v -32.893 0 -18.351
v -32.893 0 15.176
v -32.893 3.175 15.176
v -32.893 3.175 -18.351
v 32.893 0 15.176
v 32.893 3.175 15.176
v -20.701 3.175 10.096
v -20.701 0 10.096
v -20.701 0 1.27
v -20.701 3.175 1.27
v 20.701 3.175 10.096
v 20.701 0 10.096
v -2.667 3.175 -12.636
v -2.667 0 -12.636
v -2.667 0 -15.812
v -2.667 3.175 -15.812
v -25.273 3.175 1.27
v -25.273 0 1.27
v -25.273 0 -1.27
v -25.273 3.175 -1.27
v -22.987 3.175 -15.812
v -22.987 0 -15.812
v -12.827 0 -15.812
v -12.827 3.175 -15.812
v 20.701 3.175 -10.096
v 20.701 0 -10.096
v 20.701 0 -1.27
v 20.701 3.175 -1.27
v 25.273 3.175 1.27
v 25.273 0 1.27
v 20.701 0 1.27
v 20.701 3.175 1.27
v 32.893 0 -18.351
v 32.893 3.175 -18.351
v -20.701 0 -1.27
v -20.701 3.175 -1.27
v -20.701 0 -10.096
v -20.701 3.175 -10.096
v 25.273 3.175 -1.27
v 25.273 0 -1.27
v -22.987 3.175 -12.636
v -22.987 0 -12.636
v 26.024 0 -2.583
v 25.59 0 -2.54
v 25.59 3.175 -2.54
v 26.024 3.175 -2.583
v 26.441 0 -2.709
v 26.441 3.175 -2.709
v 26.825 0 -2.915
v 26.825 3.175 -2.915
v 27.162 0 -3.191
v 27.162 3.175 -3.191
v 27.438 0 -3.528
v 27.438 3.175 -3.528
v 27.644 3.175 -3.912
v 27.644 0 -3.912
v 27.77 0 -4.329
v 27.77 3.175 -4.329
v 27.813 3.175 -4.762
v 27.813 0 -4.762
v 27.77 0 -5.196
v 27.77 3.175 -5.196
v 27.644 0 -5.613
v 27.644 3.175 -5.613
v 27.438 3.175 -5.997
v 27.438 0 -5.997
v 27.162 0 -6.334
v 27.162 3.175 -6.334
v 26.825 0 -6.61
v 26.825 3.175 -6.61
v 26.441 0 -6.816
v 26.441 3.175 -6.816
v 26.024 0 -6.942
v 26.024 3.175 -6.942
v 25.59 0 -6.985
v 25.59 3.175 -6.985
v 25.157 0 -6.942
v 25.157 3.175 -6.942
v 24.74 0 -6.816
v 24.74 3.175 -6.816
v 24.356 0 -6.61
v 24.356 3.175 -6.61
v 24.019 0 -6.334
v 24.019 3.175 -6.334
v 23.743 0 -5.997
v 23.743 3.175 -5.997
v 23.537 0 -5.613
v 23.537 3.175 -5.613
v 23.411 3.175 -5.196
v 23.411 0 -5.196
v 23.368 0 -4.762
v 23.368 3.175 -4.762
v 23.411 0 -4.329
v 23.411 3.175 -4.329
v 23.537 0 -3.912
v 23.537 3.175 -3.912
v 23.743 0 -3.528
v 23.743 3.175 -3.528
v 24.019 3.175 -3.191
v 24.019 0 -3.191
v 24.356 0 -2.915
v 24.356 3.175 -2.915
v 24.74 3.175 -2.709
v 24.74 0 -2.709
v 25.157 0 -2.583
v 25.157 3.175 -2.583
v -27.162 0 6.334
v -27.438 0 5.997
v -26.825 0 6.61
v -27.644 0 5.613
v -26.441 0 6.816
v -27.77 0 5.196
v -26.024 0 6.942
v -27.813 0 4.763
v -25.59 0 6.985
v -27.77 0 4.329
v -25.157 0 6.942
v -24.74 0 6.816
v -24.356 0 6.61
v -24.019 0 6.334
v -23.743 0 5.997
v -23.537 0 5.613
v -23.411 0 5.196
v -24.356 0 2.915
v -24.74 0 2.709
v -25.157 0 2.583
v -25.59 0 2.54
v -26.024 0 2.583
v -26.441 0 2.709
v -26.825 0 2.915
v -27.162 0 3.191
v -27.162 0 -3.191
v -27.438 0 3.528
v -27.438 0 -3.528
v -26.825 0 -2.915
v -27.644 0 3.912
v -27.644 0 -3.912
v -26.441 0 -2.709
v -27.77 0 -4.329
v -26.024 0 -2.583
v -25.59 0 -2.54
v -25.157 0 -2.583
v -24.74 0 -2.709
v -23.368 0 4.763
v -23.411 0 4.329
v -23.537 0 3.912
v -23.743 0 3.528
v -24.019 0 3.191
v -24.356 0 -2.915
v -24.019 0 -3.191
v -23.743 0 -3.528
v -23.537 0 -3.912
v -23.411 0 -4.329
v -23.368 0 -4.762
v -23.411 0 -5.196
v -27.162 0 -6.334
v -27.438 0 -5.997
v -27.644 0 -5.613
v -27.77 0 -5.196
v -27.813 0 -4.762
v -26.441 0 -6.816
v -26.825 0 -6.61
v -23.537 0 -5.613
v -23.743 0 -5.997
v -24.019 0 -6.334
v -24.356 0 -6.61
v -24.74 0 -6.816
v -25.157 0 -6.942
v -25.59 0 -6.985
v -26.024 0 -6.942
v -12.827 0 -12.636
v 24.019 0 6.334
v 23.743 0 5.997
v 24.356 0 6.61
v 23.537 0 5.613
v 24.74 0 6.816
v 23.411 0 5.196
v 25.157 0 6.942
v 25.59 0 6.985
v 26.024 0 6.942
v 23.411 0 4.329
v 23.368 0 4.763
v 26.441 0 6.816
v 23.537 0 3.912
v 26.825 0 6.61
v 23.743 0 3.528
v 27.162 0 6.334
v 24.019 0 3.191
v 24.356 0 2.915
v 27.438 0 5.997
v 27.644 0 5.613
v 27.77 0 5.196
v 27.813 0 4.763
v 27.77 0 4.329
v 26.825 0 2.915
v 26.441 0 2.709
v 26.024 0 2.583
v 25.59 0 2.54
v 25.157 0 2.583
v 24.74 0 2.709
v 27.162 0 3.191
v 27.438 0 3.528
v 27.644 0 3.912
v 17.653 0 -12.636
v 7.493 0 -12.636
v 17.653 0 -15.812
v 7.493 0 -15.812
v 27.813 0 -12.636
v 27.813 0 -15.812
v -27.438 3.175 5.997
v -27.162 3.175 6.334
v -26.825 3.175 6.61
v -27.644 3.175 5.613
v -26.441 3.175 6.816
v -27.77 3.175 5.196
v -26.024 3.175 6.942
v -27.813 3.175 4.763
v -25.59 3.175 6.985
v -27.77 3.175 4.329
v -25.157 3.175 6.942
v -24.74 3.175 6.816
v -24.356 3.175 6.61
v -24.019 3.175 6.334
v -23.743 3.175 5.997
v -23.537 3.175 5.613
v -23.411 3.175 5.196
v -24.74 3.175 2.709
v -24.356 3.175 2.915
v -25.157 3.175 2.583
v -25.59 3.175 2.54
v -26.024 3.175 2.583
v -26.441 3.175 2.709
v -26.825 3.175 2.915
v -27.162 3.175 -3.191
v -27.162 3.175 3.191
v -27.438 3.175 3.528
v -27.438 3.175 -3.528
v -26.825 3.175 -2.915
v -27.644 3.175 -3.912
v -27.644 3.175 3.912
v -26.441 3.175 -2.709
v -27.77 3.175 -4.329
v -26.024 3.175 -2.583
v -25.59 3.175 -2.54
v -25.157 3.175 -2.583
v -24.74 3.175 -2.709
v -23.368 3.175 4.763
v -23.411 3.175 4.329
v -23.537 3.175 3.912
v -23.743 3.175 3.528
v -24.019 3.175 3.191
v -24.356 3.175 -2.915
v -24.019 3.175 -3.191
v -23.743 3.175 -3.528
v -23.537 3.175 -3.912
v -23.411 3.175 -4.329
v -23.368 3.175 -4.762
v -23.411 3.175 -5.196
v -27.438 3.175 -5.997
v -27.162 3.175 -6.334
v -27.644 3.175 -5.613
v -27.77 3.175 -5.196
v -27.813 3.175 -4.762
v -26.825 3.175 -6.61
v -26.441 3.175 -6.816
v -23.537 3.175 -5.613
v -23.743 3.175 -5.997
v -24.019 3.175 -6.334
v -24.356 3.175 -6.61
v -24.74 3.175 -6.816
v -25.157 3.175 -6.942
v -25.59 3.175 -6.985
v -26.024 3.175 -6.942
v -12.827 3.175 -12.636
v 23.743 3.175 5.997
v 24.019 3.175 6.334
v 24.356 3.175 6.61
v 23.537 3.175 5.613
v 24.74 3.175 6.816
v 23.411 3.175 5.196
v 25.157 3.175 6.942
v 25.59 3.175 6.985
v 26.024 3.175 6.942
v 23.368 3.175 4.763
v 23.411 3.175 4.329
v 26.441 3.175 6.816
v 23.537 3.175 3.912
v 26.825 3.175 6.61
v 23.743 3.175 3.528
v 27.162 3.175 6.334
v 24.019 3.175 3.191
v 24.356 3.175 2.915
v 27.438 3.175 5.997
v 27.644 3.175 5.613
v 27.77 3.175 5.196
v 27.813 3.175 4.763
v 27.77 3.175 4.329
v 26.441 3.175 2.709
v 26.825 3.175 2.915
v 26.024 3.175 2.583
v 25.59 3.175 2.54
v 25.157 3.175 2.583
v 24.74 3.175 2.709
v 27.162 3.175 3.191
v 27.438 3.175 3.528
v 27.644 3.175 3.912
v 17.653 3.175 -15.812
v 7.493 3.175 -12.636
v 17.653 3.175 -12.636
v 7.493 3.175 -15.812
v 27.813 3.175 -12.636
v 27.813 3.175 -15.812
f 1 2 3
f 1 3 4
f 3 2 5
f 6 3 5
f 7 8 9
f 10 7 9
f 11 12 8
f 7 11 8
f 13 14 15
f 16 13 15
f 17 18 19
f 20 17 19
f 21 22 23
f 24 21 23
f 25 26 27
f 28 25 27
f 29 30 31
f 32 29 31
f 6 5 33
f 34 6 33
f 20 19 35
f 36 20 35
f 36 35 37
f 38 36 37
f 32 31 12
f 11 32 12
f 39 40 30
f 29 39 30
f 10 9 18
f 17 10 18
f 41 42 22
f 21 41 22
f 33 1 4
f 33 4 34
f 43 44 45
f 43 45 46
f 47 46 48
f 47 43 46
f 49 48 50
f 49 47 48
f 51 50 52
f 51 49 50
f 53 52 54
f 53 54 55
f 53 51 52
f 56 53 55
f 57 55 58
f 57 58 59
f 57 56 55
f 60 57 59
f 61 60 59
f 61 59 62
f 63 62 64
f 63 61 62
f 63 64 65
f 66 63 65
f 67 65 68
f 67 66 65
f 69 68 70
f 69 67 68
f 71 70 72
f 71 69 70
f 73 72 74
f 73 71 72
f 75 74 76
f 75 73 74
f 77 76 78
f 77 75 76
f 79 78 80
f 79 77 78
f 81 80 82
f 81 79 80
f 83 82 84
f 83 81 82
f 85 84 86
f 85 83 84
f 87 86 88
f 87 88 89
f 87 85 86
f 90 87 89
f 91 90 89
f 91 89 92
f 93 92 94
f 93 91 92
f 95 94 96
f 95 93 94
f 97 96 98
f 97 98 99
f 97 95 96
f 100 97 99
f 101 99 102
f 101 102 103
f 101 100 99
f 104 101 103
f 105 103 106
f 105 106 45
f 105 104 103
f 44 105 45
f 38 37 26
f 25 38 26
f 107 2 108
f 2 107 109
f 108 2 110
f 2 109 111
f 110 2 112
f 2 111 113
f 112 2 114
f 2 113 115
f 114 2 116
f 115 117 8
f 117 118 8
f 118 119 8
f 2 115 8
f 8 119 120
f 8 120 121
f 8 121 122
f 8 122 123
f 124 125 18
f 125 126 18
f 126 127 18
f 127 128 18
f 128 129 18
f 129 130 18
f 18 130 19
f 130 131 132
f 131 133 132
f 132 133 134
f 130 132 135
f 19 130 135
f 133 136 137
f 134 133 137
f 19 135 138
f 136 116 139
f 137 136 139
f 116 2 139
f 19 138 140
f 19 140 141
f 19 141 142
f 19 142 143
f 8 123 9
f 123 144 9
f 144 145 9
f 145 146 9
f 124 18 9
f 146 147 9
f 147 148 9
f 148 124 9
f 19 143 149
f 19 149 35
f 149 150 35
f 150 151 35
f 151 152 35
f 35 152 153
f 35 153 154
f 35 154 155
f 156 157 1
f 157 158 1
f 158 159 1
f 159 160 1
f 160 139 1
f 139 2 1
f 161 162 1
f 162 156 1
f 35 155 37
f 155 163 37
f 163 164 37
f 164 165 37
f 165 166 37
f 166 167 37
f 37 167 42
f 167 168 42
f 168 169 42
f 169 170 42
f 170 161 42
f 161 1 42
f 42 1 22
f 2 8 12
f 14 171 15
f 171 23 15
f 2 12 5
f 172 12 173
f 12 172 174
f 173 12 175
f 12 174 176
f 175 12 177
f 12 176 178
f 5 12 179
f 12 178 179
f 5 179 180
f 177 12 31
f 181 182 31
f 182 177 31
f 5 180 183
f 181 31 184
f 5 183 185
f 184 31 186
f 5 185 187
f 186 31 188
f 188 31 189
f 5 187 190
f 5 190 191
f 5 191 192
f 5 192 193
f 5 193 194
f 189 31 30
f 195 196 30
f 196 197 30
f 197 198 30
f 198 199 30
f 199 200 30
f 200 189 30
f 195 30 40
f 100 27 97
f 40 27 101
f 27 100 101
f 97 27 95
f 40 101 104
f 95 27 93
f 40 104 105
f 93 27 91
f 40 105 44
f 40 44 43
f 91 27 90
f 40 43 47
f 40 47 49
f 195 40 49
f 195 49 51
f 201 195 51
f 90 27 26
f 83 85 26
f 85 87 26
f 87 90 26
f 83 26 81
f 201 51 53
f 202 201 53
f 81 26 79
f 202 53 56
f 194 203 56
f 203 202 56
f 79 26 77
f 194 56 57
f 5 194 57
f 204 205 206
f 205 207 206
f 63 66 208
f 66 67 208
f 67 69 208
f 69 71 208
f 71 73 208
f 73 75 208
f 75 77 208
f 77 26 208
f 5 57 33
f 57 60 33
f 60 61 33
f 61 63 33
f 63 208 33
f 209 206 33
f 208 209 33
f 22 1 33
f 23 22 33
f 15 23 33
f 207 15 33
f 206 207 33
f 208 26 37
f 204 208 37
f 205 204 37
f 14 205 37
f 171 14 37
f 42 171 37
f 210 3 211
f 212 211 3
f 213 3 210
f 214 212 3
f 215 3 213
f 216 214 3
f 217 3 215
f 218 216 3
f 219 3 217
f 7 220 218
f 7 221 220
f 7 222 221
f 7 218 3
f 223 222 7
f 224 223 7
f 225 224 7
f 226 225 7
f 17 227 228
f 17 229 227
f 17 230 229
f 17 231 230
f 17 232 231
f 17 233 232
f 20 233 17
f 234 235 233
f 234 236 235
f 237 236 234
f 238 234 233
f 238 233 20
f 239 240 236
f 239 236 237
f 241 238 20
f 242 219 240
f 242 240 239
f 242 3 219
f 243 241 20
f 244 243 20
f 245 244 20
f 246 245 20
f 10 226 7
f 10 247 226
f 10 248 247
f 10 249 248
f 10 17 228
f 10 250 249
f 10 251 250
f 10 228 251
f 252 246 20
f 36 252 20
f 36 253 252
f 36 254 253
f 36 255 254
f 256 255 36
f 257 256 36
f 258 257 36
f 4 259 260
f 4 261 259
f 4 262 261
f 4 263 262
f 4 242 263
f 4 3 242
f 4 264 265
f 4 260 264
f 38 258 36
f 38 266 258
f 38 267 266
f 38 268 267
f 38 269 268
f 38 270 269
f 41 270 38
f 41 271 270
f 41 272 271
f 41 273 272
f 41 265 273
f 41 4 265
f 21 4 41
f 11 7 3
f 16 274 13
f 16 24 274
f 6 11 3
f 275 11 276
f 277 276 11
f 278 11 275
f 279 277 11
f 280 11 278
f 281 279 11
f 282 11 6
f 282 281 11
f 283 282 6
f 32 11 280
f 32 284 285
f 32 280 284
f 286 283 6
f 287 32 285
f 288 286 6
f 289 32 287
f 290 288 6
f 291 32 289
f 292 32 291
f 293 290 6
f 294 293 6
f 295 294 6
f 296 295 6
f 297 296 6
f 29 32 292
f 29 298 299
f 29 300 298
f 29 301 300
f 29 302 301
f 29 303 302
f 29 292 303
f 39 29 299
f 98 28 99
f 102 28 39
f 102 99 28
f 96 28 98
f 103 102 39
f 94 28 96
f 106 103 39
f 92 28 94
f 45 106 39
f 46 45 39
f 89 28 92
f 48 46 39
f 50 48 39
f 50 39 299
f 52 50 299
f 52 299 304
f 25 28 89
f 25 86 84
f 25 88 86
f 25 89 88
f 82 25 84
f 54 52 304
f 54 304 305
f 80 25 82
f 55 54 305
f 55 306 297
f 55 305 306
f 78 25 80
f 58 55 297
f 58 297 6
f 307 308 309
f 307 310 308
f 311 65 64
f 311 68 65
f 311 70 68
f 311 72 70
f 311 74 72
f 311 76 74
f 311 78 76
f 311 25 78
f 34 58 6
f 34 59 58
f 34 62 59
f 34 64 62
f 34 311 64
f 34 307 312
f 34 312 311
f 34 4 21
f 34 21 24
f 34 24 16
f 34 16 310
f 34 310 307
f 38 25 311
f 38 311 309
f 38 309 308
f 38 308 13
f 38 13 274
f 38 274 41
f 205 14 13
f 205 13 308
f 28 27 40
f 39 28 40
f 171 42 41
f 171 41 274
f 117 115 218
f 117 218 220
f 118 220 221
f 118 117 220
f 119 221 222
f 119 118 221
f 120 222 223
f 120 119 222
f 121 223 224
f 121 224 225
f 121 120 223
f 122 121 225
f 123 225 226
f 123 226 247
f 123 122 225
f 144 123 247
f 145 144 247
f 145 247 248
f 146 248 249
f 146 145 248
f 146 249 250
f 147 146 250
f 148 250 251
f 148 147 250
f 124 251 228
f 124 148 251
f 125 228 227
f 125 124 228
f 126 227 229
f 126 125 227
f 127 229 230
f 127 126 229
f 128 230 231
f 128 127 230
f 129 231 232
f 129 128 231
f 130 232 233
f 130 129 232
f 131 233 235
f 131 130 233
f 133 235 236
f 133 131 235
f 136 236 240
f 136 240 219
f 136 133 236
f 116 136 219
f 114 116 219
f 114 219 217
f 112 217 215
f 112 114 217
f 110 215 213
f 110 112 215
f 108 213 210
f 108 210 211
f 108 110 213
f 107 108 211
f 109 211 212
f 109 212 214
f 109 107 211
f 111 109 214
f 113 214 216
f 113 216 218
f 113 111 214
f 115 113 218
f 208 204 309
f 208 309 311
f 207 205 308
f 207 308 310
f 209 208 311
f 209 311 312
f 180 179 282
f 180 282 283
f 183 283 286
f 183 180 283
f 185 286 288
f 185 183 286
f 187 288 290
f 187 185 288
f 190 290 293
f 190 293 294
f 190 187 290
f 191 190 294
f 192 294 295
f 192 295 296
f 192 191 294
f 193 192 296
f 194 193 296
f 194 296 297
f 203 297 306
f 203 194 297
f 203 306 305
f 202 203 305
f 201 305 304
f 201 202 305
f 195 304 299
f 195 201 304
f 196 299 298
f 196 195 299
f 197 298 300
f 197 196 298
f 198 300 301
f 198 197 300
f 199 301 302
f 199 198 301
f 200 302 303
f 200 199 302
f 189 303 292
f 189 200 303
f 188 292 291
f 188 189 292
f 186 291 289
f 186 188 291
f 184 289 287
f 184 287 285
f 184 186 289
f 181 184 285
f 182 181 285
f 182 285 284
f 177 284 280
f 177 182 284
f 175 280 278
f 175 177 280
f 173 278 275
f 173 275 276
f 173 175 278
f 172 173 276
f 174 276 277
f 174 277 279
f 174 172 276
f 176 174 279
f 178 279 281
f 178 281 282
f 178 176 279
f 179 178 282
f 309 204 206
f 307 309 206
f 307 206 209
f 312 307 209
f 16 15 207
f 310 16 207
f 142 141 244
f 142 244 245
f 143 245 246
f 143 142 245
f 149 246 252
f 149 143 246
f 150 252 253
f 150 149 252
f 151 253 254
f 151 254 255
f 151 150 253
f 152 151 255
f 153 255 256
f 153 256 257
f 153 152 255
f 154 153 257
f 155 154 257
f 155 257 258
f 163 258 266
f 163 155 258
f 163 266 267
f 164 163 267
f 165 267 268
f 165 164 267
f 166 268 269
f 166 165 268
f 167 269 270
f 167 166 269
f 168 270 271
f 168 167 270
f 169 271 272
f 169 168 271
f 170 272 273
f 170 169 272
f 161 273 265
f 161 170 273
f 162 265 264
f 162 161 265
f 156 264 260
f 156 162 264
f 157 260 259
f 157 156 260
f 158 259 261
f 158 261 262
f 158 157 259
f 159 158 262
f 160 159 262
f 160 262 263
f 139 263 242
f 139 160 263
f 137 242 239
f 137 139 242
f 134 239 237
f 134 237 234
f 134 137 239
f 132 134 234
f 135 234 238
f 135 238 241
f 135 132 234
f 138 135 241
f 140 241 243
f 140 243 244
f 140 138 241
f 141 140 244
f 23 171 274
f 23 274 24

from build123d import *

# Parameters (mm, degrees)
SKETCH1_W           = 65.786
SKETCH1_H           = 33.528
SKETCH1_R           = 2.2225
SKETCH1_W_2         = 10.16
SKETCH1_H_2         = 3.175
BOSS_EXTRUDE2_DEPTH = 3.175


with BuildPart() as part:
    # Sketch1 → Boss-Extrude2 (new body)
    with BuildSketch(Plane(origin=(0, 0, 0), x_dir=(1, 0, 0), z_dir=(0, 1, 0))):
        with Locations((0, 1.5875)):
            Rectangle(SKETCH1_W, SKETCH1_H)
        with Locations(Location((-25.5905, -4.7625, 0), (0, 0, 270))):
            Circle(SKETCH1_R, mode=Mode.SUBTRACT)
        Polygon((20.701, -10.0965), (-20.701, -10.0965), (-20.701, -1.27), (-25.273, -1.27), (-25.273, 1.27), (-20.701, 1.27), (-20.701, 10.0965), (20.701, 10.0965), (20.701, 1.27), (25.273, 1.27), (25.273, -1.27), (20.701, -1.27), align=None, mode=Mode.SUBTRACT)
        with Locations(Location((25.5905, -4.7625, 0), (0, 0, 270))):
            Circle(SKETCH1_R, mode=Mode.SUBTRACT)
        with Locations(Location((-25.5905, 4.7625, 0), (0, 0, 270))):
            Circle(SKETCH1_R, mode=Mode.SUBTRACT)
        with Locations((-17.907, 14.224)):
            Rectangle(SKETCH1_W_2, SKETCH1_H_2, mode=Mode.SUBTRACT)
        with Locations(Location((25.5905, 4.7625, 0), (0, 0, 270))):
            Circle(SKETCH1_R, mode=Mode.SUBTRACT)
        with Locations((2.413, 14.224)):
            Rectangle(SKETCH1_W_2, SKETCH1_H_2, mode=Mode.SUBTRACT)
        with Locations((22.733, 14.224)):
            Rectangle(SKETCH1_W_2, SKETCH1_H_2, mode=Mode.SUBTRACT)
    extrude(amount=BOSS_EXTRUDE2_DEPTH)


solid = part.part
